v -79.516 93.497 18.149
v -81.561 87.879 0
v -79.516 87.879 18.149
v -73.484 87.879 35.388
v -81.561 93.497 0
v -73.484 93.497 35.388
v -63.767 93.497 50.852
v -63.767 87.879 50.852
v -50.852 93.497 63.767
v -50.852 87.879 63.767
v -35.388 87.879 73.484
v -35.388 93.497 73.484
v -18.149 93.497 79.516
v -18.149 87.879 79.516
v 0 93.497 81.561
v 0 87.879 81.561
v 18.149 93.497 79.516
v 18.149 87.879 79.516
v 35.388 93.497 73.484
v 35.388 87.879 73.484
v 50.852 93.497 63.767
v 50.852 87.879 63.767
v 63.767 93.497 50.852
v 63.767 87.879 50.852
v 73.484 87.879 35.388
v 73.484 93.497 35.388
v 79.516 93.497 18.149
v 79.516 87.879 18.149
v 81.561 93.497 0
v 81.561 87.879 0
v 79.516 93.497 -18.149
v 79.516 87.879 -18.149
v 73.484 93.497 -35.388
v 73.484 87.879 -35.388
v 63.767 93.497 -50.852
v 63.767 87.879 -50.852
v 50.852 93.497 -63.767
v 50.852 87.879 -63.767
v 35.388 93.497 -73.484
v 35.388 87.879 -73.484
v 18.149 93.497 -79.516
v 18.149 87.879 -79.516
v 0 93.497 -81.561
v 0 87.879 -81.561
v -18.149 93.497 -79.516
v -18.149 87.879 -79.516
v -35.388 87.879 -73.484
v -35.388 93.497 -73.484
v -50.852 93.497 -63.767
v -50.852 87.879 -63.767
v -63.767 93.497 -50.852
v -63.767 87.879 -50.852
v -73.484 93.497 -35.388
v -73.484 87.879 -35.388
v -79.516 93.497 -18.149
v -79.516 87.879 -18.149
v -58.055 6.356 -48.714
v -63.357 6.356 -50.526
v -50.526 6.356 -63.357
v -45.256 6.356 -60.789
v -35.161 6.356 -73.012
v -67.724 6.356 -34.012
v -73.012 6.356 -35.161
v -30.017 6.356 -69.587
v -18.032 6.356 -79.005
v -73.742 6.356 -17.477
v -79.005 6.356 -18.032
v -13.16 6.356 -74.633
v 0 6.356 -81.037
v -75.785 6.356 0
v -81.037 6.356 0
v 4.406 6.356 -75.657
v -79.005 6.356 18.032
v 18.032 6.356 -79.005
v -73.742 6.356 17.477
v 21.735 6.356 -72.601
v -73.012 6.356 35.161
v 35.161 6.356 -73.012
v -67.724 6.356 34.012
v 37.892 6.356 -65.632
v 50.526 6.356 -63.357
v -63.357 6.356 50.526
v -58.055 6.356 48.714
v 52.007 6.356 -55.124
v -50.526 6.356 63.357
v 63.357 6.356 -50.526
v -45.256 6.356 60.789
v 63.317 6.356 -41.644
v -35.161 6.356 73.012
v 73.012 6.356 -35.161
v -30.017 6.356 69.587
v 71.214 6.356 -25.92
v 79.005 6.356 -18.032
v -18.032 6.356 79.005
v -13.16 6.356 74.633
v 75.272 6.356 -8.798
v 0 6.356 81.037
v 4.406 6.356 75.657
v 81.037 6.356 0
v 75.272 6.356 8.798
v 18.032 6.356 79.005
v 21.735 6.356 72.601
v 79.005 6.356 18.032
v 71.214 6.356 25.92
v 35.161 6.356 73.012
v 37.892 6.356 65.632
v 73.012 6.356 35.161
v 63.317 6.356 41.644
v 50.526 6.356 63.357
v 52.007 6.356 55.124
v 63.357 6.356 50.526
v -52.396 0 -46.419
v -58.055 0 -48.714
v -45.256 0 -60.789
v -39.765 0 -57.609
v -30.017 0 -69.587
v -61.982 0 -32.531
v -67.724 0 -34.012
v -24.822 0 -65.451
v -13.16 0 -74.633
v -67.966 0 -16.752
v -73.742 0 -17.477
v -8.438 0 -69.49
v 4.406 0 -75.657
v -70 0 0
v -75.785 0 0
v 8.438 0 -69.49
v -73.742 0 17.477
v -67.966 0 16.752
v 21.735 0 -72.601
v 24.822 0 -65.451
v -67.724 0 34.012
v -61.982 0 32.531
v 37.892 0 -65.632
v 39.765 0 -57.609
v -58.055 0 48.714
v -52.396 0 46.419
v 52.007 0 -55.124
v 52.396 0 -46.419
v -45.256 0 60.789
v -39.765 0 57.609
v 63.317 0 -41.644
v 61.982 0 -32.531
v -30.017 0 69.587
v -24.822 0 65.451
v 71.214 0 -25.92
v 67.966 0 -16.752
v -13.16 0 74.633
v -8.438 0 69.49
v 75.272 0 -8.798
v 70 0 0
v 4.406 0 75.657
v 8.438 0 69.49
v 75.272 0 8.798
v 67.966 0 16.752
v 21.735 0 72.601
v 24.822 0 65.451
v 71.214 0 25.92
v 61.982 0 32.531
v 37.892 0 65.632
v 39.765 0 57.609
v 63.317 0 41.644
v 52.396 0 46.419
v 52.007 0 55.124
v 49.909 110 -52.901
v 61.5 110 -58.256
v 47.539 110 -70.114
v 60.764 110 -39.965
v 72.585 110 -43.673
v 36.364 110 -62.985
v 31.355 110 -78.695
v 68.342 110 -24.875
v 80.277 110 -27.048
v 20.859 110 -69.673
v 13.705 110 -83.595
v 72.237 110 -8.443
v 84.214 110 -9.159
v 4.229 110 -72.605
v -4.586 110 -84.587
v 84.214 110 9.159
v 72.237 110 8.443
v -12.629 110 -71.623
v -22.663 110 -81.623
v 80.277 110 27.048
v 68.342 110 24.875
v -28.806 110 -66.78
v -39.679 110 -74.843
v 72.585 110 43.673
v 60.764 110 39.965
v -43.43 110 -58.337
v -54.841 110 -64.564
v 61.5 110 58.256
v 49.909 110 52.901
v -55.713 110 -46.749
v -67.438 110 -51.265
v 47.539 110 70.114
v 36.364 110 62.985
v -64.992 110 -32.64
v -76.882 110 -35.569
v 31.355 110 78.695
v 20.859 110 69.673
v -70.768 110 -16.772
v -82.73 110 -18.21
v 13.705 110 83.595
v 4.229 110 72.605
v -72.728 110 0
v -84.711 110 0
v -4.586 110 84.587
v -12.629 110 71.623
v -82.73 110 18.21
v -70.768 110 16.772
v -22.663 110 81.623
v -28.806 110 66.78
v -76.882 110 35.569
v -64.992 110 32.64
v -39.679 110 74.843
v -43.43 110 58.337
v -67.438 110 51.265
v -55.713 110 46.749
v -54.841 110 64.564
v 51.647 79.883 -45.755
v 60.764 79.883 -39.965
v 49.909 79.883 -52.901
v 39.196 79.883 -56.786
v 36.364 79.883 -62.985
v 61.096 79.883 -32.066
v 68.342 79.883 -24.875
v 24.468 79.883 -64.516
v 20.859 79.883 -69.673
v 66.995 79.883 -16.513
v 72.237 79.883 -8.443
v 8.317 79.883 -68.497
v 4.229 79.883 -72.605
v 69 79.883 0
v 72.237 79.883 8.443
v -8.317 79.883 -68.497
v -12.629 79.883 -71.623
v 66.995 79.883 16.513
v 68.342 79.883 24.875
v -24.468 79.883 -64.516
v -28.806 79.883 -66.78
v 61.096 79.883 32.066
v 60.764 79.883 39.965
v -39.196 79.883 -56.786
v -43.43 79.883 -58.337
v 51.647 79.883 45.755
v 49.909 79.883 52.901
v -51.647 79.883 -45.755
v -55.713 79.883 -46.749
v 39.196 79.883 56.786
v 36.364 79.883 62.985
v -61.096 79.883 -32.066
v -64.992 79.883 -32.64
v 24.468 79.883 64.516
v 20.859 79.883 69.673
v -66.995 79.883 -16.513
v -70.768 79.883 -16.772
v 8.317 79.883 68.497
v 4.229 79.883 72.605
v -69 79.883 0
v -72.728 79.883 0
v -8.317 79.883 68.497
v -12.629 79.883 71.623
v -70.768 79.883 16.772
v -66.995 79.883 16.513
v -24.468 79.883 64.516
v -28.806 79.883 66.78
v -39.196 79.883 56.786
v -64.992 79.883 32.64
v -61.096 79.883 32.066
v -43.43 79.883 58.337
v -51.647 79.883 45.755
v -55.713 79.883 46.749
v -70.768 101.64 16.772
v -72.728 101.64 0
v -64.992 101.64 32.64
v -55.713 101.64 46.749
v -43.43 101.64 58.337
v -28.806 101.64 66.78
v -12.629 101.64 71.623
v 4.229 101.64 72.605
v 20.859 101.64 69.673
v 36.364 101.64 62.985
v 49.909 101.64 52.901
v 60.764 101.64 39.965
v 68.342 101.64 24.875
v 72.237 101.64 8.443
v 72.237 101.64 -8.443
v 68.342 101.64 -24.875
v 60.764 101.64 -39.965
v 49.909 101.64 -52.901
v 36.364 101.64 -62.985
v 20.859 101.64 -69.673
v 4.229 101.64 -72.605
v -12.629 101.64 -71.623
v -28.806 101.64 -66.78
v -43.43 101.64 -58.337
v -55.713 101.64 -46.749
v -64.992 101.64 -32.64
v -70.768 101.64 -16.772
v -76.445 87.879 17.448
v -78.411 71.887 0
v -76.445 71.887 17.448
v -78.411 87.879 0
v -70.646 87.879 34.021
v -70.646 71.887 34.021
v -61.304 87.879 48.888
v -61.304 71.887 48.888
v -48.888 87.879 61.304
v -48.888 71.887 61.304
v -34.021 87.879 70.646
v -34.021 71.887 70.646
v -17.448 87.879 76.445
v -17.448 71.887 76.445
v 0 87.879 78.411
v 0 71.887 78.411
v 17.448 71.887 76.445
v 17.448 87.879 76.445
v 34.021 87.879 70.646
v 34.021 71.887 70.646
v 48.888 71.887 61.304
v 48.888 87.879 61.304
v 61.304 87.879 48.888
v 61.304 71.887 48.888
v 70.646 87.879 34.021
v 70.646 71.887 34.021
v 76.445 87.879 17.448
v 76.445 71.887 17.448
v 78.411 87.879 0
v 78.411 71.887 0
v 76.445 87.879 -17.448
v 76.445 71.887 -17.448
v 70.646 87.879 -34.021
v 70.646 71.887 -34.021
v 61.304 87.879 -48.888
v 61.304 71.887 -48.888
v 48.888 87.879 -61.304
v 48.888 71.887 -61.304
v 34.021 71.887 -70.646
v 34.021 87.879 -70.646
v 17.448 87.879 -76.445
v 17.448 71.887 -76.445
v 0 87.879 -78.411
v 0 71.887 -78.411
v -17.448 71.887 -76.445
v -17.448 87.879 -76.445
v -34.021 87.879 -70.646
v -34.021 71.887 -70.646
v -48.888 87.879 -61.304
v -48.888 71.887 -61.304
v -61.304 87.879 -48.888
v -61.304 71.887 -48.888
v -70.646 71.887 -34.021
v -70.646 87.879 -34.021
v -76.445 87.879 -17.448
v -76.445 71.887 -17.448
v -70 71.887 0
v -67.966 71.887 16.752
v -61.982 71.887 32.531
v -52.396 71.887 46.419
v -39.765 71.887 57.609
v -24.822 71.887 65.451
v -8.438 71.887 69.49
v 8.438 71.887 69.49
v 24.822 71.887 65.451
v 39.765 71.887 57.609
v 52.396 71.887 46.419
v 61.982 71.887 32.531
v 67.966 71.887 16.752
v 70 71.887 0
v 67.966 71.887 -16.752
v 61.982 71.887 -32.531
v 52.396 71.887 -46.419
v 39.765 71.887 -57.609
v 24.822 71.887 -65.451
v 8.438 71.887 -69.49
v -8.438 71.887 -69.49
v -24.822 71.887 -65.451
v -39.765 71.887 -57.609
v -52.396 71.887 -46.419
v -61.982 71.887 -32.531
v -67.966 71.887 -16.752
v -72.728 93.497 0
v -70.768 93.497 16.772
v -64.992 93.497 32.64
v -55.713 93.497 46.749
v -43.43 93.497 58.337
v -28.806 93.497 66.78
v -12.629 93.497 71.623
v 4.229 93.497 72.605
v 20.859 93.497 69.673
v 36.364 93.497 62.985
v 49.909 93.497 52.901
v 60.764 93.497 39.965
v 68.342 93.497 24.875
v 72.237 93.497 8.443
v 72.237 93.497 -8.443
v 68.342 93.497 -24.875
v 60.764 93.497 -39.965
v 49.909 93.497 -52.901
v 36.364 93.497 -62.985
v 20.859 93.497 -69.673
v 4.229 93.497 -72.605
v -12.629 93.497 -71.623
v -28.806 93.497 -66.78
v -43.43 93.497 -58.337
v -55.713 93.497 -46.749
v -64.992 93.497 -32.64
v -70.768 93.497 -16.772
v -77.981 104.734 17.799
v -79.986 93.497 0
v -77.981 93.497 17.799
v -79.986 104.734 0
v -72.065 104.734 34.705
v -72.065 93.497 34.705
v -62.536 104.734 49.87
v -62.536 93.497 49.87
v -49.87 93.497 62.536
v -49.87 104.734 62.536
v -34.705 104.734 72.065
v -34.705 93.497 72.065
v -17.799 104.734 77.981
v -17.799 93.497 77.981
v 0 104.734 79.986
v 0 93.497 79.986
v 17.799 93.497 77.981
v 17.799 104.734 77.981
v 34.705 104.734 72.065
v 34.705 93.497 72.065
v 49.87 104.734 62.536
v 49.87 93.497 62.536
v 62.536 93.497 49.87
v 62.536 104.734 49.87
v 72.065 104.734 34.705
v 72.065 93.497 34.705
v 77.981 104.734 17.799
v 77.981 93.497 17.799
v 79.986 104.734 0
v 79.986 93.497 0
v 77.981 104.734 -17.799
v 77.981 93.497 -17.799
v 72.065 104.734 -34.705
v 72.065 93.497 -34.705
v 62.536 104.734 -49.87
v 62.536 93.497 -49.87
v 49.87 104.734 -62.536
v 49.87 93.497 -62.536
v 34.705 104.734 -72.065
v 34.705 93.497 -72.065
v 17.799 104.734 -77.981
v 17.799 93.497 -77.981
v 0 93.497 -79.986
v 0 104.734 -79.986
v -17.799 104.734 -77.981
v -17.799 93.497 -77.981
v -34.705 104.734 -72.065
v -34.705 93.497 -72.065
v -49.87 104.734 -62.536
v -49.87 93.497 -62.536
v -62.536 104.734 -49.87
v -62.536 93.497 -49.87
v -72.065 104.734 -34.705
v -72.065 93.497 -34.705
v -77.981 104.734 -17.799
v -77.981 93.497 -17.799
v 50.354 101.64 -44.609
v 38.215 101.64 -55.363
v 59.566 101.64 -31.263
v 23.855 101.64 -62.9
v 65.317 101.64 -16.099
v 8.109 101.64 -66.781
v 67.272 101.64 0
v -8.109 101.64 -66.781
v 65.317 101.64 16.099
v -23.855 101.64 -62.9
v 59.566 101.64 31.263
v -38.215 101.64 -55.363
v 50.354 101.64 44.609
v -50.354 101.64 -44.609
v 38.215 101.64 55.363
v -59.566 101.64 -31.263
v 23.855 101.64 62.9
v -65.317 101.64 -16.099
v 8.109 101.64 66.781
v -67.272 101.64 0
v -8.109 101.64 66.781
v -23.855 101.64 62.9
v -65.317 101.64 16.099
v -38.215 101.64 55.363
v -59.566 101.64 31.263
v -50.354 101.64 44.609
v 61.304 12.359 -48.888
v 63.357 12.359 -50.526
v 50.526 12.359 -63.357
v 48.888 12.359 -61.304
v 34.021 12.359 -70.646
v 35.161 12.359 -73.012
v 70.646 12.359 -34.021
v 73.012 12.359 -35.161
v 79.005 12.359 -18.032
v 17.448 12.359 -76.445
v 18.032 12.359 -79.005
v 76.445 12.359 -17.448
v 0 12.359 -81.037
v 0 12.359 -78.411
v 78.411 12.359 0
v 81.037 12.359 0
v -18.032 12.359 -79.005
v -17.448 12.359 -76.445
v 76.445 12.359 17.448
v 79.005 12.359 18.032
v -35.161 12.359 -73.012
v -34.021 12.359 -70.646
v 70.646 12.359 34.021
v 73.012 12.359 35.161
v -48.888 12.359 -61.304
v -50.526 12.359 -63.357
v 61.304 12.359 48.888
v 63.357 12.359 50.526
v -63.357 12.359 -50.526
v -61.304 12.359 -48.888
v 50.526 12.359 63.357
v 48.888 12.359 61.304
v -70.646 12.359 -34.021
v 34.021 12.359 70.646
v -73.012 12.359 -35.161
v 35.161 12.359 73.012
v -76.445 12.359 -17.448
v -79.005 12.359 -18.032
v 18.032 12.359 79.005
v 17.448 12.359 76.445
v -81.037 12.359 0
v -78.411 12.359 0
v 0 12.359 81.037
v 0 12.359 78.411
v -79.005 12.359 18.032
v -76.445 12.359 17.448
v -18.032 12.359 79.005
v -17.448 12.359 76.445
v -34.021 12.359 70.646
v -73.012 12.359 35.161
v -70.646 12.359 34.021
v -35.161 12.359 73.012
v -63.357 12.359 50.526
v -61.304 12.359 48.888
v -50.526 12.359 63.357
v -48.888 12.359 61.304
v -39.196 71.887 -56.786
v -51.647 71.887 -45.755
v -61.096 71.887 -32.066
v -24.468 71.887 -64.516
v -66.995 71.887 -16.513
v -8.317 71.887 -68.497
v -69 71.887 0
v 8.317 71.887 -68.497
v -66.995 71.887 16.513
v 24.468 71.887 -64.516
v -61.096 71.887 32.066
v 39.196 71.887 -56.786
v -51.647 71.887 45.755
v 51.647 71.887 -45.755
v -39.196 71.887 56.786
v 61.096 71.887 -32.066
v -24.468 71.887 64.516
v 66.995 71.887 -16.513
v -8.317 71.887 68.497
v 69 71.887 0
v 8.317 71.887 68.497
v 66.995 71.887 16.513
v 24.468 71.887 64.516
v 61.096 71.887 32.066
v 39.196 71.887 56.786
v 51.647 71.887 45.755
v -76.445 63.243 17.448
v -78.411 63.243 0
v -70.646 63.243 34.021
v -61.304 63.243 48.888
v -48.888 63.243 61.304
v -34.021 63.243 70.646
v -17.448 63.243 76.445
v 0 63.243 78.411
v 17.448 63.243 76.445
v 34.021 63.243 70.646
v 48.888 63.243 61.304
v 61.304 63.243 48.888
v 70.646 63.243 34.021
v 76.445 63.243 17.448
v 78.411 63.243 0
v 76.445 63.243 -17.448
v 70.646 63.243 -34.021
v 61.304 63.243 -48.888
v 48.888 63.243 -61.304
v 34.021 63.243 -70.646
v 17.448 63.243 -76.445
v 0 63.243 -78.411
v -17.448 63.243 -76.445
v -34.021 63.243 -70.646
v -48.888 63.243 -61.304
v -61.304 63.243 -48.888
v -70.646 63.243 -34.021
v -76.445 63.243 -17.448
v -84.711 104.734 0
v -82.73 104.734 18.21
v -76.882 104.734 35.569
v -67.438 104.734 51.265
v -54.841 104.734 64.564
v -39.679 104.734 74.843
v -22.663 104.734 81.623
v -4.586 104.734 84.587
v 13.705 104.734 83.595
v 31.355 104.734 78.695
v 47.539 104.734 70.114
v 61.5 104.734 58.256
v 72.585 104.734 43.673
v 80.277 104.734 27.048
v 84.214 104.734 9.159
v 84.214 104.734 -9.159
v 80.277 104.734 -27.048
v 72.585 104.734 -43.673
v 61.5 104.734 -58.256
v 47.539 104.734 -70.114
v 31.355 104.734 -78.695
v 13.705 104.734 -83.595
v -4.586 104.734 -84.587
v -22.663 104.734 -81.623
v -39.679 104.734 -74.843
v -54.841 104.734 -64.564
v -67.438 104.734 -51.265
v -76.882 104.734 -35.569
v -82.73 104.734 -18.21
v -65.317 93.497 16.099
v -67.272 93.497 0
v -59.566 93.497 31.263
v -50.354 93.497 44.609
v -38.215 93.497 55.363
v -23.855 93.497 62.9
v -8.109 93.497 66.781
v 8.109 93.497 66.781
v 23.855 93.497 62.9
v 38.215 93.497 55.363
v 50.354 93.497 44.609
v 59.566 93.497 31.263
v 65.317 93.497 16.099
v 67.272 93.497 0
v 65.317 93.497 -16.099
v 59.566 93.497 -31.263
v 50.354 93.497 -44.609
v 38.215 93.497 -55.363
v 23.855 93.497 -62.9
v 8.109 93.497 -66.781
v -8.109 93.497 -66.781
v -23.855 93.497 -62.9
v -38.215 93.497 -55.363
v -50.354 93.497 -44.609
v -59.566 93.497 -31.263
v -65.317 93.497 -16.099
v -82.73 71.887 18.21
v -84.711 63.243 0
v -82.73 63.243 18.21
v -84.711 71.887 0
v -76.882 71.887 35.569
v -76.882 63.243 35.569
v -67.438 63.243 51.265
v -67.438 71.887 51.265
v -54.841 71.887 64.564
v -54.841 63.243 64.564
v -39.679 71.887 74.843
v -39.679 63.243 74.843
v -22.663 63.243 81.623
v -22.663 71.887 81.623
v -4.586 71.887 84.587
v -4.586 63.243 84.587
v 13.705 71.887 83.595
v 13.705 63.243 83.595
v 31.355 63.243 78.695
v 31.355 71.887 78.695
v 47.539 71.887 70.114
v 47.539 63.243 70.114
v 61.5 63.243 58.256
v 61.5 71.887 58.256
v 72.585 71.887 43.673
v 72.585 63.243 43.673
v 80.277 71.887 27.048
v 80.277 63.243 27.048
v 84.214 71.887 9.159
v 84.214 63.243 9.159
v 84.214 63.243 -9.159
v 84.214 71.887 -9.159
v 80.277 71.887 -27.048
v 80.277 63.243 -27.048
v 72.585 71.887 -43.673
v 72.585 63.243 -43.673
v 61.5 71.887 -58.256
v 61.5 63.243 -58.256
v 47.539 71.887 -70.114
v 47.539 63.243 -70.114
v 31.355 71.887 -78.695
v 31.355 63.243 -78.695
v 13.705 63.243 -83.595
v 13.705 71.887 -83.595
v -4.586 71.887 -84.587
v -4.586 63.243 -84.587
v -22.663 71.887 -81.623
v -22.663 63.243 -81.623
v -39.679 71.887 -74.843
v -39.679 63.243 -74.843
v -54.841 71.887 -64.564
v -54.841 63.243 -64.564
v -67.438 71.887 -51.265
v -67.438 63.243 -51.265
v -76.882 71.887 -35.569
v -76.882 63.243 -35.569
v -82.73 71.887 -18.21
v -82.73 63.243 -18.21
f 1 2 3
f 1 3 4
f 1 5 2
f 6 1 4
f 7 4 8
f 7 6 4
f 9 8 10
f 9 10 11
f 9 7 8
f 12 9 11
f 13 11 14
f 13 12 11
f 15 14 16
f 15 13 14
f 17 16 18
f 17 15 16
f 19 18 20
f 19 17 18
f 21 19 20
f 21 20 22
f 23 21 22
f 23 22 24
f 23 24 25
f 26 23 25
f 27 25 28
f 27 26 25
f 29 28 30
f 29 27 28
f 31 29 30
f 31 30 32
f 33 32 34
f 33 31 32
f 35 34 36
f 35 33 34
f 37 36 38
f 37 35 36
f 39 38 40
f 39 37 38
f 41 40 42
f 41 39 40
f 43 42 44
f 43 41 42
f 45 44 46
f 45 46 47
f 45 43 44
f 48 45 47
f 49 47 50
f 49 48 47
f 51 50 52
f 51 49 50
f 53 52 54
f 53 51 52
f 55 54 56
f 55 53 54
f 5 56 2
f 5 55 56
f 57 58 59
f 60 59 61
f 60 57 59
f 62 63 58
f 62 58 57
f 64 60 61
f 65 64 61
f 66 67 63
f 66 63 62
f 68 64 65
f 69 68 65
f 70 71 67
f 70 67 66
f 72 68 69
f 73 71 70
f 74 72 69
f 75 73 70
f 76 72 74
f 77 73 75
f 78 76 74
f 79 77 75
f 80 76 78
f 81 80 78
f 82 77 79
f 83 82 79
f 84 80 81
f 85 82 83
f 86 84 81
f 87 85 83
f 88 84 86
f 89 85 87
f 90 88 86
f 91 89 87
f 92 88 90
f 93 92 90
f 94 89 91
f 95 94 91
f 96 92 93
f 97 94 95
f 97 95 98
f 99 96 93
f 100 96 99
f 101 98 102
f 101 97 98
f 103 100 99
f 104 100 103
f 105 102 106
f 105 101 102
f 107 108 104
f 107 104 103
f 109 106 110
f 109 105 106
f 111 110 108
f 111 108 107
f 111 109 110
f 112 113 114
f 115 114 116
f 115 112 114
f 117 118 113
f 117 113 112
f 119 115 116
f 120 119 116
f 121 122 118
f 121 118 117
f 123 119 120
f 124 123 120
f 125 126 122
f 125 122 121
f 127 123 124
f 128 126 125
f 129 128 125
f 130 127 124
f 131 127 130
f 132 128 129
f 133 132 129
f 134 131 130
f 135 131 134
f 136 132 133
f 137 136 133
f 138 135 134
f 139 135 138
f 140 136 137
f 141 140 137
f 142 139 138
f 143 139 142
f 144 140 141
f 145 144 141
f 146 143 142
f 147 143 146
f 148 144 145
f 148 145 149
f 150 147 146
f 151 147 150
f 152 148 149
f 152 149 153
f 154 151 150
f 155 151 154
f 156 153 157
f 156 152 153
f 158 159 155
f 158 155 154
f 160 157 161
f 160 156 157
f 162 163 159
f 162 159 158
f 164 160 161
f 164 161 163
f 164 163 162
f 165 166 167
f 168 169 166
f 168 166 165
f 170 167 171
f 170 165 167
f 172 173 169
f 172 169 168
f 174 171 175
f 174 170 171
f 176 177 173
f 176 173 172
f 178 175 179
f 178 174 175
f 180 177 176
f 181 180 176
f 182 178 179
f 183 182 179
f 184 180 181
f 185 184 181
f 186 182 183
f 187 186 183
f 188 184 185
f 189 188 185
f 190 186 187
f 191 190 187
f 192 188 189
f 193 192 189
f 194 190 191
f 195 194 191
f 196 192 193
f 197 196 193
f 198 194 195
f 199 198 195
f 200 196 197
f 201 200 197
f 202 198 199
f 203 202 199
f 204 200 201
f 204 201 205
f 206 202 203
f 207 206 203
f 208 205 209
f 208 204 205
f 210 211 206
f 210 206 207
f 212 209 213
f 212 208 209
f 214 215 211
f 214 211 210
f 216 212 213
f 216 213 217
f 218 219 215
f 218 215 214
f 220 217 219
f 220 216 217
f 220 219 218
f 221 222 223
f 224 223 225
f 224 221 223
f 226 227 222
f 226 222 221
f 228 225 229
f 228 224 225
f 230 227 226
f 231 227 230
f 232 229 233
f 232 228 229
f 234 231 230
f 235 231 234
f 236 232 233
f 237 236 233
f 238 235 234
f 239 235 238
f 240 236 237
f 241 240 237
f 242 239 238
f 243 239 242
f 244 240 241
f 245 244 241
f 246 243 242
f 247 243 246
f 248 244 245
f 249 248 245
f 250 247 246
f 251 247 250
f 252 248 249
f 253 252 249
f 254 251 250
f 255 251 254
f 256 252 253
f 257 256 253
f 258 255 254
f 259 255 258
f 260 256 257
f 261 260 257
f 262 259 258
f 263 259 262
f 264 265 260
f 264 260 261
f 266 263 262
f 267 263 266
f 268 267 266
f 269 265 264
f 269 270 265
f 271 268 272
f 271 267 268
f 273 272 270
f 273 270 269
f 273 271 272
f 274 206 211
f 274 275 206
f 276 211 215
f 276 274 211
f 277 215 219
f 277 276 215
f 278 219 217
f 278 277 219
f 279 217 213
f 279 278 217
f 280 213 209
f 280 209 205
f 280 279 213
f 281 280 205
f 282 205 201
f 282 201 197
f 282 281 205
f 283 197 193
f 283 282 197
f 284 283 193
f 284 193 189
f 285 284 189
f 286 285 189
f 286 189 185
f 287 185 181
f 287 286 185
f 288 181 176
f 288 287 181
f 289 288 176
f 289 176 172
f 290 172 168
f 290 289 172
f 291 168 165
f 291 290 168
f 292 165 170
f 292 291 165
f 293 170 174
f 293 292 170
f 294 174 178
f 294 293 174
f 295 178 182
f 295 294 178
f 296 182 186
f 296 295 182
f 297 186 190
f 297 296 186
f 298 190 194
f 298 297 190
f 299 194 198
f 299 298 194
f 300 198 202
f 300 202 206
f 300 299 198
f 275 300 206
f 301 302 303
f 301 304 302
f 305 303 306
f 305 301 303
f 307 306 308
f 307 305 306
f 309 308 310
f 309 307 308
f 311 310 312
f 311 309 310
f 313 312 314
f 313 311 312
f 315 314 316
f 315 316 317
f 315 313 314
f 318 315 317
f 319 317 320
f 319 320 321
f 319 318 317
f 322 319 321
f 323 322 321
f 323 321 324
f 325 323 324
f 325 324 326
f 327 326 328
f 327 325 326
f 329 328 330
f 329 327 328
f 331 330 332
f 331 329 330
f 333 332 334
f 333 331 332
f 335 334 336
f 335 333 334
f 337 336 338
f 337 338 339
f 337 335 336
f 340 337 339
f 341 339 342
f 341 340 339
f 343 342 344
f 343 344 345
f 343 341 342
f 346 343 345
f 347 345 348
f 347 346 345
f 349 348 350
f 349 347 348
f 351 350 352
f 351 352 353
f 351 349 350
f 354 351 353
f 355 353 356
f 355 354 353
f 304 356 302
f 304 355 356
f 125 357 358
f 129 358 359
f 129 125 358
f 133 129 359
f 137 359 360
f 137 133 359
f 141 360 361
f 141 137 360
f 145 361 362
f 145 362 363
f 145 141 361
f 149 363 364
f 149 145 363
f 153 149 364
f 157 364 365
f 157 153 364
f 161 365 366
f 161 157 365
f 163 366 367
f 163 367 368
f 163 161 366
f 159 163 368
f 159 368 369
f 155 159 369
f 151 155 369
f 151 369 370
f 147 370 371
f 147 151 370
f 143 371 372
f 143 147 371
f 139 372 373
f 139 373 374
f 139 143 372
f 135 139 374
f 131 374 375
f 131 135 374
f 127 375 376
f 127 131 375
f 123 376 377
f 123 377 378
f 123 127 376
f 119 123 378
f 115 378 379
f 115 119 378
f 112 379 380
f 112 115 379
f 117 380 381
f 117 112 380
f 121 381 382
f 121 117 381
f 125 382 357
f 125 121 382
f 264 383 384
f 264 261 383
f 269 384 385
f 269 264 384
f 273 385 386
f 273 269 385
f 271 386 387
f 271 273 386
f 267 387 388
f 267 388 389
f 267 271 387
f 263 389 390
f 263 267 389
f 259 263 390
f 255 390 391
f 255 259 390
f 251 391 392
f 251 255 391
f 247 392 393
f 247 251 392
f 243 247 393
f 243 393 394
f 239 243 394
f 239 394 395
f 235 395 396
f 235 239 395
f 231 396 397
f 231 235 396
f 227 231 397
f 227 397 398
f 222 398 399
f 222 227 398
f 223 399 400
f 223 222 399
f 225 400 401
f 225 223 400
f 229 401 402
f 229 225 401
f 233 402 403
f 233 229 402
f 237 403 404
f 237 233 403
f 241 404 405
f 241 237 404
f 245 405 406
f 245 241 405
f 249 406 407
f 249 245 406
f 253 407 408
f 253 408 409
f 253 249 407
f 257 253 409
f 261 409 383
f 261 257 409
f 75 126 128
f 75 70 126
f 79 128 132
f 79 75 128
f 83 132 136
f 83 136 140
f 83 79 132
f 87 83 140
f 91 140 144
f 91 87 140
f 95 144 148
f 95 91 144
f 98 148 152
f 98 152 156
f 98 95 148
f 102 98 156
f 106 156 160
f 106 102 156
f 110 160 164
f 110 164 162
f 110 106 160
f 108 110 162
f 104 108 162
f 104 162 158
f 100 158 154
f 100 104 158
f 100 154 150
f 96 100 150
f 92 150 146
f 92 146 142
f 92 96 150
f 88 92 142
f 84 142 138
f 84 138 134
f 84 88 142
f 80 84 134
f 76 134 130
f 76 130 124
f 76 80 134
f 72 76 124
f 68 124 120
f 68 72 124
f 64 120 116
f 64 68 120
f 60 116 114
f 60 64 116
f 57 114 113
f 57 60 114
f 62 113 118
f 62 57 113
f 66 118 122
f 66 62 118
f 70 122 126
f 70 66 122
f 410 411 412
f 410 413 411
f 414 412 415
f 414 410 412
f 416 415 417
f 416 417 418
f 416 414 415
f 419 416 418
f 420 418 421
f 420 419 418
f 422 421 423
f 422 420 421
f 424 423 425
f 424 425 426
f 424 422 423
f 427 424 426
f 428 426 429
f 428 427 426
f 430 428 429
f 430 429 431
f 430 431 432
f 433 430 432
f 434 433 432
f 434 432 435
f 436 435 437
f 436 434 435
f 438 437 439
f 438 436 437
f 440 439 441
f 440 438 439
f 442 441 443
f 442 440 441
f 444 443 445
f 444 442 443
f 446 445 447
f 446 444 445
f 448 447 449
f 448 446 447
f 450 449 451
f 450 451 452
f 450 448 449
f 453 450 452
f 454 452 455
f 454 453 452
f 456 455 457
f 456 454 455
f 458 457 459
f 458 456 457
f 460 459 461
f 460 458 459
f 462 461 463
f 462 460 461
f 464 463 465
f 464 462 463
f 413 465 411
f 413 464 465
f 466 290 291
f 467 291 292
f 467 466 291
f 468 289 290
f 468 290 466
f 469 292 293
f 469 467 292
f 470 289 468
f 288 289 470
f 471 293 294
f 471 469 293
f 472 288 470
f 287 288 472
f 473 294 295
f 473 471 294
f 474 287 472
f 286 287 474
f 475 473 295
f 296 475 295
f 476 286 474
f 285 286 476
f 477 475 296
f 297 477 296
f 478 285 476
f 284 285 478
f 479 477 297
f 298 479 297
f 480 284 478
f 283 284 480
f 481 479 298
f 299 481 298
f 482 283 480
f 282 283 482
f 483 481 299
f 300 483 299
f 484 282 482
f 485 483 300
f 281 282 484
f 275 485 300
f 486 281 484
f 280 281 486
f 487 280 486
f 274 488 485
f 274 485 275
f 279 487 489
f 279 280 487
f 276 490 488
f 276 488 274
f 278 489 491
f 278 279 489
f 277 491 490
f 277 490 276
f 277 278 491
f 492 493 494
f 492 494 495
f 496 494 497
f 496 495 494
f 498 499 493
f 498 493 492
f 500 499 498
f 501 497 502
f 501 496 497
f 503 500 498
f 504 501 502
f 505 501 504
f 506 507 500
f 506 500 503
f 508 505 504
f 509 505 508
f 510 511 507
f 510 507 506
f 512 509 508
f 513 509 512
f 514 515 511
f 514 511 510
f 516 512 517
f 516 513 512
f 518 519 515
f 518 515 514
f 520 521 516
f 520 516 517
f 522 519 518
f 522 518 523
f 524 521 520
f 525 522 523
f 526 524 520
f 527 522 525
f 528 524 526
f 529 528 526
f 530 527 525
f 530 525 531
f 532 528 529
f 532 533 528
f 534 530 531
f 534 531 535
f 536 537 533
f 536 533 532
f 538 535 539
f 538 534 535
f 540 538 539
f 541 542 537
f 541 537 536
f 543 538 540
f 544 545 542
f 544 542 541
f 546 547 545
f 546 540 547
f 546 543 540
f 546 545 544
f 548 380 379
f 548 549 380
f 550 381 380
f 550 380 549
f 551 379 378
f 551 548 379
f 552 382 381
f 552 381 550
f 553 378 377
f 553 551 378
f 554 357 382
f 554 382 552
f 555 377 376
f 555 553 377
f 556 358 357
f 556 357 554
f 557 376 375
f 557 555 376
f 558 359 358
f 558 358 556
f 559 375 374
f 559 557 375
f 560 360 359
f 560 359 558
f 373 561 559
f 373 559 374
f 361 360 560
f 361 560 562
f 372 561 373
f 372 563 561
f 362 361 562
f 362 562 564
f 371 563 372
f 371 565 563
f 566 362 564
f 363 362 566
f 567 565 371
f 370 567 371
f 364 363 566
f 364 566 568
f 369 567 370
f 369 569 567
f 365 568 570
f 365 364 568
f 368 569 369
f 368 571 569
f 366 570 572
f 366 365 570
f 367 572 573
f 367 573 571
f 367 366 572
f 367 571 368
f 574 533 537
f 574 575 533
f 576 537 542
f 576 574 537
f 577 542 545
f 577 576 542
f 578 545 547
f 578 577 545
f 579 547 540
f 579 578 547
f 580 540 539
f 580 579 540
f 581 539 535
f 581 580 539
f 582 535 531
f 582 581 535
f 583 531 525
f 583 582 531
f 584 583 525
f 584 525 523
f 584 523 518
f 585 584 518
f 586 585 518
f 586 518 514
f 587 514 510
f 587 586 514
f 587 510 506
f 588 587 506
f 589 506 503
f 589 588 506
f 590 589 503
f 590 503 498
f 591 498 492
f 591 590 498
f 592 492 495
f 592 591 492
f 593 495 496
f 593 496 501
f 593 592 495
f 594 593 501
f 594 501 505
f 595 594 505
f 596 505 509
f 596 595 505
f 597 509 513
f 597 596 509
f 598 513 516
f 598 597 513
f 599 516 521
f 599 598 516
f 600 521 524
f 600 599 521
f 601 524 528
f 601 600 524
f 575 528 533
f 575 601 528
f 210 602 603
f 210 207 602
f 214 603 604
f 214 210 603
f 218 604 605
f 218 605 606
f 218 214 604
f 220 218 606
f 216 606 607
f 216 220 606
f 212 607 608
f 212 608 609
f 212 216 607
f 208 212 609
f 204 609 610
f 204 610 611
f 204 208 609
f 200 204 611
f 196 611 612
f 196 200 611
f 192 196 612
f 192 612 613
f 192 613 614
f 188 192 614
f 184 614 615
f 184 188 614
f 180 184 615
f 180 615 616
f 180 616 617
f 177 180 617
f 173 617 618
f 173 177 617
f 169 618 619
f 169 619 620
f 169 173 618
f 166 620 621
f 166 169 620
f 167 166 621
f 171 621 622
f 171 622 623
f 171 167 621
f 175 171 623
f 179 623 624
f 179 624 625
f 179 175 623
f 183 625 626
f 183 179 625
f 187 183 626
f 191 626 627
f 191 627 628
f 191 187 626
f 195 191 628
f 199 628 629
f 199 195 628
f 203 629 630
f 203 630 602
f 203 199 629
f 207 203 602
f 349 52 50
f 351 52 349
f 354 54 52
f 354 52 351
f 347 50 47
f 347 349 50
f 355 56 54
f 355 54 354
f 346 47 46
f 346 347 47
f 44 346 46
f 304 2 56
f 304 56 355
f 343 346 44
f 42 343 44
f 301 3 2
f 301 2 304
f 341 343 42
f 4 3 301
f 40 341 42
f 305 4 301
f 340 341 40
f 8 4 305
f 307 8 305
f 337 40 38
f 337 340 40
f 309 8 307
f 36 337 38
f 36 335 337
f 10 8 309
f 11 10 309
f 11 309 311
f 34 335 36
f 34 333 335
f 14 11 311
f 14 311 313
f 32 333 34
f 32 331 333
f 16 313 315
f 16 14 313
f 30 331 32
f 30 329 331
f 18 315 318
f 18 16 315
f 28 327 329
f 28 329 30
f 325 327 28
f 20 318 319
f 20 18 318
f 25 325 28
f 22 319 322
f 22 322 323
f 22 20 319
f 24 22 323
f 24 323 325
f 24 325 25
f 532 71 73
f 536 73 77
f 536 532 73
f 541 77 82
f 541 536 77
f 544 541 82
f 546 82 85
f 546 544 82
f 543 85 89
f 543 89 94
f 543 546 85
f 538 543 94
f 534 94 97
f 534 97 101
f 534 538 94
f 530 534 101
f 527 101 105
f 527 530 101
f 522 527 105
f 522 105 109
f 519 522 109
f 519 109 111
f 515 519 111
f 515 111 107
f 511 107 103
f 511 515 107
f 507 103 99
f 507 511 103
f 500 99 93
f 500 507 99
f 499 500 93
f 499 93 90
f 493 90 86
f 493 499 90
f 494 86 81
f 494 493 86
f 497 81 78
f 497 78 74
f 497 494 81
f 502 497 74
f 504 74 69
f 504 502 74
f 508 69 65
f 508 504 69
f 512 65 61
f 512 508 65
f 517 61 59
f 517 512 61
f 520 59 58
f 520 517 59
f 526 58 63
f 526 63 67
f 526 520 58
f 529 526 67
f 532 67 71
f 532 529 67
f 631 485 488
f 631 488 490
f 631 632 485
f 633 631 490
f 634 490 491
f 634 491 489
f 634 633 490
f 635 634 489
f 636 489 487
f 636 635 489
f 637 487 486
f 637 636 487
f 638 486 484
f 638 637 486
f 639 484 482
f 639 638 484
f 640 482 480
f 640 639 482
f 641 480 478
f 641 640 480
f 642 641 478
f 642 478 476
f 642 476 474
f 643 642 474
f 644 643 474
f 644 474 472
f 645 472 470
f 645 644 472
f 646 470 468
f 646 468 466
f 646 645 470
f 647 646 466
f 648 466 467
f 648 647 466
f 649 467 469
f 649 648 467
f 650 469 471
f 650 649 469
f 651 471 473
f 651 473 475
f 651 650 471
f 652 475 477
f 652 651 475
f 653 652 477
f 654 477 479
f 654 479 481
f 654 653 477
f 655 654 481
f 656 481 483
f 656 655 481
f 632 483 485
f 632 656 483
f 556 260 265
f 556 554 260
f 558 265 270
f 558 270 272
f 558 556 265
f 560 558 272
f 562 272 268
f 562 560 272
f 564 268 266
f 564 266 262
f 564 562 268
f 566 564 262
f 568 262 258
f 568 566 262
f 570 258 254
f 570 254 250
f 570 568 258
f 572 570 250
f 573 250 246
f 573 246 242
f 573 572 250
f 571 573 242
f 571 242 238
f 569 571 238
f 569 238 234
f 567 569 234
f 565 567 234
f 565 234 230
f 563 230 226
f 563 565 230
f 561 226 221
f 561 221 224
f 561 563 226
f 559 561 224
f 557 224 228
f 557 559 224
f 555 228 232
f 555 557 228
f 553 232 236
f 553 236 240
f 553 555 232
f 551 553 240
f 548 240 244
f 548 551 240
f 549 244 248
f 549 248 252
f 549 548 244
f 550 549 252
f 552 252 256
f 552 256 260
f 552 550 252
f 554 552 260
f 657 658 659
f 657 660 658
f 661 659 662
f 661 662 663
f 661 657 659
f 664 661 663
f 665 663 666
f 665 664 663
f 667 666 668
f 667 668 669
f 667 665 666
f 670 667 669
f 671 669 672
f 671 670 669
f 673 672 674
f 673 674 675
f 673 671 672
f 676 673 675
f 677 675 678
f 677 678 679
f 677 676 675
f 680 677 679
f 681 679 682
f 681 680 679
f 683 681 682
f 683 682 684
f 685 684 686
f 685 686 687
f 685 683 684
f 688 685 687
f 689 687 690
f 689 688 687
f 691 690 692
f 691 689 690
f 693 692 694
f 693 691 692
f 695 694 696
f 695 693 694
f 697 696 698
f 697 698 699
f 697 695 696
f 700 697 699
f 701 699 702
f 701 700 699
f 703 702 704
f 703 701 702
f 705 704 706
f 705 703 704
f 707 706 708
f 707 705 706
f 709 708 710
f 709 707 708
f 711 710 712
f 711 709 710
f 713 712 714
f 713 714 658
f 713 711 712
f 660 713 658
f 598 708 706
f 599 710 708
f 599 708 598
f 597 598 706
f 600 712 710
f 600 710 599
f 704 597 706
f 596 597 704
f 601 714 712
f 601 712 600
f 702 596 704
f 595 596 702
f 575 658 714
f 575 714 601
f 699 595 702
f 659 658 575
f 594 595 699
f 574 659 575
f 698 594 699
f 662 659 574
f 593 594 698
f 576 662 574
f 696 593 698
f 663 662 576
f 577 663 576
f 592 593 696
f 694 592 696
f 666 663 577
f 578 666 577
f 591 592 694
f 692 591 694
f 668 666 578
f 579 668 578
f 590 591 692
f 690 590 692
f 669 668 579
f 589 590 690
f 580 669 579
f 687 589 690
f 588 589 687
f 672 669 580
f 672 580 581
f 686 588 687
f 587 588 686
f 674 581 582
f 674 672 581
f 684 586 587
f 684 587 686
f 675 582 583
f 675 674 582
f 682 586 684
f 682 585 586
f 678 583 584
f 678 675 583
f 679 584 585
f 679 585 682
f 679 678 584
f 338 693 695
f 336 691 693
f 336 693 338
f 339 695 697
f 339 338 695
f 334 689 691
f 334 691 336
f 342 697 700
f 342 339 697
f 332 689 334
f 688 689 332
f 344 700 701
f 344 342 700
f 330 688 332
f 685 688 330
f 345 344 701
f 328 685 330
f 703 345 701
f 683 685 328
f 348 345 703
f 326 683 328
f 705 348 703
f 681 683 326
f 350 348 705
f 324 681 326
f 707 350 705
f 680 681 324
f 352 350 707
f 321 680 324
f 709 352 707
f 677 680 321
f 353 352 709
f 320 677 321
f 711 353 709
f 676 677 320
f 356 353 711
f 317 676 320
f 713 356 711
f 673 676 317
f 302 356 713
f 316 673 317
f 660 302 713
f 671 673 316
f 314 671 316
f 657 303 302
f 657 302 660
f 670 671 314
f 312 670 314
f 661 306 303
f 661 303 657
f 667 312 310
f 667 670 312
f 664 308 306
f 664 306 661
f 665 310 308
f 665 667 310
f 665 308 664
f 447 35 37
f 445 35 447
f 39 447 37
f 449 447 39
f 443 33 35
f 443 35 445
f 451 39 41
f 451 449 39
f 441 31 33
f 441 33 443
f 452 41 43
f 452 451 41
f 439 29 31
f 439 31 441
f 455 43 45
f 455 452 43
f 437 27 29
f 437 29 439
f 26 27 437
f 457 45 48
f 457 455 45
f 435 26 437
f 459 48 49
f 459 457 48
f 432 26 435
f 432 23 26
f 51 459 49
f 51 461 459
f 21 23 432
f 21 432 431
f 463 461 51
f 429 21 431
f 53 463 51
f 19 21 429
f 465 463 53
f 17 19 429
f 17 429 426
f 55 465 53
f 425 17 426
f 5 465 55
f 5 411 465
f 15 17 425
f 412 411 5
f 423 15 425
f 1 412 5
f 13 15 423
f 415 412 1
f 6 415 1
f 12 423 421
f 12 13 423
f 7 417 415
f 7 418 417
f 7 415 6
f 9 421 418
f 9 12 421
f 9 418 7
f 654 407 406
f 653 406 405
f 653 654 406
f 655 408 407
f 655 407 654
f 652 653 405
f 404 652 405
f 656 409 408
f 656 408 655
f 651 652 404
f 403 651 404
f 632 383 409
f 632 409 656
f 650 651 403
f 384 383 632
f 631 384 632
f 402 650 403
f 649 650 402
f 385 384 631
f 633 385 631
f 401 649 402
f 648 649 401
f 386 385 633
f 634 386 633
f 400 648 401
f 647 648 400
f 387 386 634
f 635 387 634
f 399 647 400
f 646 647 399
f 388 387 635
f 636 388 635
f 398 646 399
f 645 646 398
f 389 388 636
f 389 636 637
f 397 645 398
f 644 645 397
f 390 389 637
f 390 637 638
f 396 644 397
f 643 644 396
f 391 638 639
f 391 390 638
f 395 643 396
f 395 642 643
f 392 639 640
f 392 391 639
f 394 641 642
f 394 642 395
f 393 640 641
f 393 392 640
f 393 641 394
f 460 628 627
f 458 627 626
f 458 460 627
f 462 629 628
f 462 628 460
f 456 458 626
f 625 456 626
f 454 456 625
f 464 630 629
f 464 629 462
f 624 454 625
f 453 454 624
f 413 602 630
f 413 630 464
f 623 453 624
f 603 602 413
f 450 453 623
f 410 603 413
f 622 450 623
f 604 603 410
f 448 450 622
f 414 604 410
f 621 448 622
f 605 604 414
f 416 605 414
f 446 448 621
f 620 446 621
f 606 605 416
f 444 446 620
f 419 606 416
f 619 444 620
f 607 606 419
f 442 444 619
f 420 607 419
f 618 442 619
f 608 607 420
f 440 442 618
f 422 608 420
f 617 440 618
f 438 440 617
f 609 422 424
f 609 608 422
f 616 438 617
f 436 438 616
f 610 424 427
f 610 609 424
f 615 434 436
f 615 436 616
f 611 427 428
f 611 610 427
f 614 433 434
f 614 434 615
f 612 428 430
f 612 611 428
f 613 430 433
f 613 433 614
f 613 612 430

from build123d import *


with BuildPart() as part:
    # Sketch1 → Revolve1 (revolve)
    with BuildSketch(Plane.XY):
        Polygon((-75.784806401, 0), (-75.784806401, 6.356320182), (-81.037271199, 6.356320182), (-81.037271199, 12.359137093), (-78.4110388, 12.359137093), (-78.4110388, 63.243015116), (-84.710995149, 63.243015116), (-84.710995149, 71.887071469), (-78.4110388, 71.887071469), (-78.4110388, 87.878575722), (-81.561016974, 87.878575722), (-81.561016974, 93.497212352), (-79.986027887, 93.497212352), (-79.986027887, 104.734485611), (-84.710995149, 104.734485611), (-84.710995149, 110), (-72.728358467, 110), (-72.728358467, 101.639947534), (-67.271641533, 101.639947534), (-67.271641533, 93.497212352), (-72.728358467, 93.497212352), (-72.728358467, 79.882823596), (-69, 79.882823596), (-69, 71.887071469), (-70, 71.887071469), (-70, 0), align=None)
    revolve(axis=Axis((0, -0.310935058, 0), (0, 1, 0)))


solid = part.part
